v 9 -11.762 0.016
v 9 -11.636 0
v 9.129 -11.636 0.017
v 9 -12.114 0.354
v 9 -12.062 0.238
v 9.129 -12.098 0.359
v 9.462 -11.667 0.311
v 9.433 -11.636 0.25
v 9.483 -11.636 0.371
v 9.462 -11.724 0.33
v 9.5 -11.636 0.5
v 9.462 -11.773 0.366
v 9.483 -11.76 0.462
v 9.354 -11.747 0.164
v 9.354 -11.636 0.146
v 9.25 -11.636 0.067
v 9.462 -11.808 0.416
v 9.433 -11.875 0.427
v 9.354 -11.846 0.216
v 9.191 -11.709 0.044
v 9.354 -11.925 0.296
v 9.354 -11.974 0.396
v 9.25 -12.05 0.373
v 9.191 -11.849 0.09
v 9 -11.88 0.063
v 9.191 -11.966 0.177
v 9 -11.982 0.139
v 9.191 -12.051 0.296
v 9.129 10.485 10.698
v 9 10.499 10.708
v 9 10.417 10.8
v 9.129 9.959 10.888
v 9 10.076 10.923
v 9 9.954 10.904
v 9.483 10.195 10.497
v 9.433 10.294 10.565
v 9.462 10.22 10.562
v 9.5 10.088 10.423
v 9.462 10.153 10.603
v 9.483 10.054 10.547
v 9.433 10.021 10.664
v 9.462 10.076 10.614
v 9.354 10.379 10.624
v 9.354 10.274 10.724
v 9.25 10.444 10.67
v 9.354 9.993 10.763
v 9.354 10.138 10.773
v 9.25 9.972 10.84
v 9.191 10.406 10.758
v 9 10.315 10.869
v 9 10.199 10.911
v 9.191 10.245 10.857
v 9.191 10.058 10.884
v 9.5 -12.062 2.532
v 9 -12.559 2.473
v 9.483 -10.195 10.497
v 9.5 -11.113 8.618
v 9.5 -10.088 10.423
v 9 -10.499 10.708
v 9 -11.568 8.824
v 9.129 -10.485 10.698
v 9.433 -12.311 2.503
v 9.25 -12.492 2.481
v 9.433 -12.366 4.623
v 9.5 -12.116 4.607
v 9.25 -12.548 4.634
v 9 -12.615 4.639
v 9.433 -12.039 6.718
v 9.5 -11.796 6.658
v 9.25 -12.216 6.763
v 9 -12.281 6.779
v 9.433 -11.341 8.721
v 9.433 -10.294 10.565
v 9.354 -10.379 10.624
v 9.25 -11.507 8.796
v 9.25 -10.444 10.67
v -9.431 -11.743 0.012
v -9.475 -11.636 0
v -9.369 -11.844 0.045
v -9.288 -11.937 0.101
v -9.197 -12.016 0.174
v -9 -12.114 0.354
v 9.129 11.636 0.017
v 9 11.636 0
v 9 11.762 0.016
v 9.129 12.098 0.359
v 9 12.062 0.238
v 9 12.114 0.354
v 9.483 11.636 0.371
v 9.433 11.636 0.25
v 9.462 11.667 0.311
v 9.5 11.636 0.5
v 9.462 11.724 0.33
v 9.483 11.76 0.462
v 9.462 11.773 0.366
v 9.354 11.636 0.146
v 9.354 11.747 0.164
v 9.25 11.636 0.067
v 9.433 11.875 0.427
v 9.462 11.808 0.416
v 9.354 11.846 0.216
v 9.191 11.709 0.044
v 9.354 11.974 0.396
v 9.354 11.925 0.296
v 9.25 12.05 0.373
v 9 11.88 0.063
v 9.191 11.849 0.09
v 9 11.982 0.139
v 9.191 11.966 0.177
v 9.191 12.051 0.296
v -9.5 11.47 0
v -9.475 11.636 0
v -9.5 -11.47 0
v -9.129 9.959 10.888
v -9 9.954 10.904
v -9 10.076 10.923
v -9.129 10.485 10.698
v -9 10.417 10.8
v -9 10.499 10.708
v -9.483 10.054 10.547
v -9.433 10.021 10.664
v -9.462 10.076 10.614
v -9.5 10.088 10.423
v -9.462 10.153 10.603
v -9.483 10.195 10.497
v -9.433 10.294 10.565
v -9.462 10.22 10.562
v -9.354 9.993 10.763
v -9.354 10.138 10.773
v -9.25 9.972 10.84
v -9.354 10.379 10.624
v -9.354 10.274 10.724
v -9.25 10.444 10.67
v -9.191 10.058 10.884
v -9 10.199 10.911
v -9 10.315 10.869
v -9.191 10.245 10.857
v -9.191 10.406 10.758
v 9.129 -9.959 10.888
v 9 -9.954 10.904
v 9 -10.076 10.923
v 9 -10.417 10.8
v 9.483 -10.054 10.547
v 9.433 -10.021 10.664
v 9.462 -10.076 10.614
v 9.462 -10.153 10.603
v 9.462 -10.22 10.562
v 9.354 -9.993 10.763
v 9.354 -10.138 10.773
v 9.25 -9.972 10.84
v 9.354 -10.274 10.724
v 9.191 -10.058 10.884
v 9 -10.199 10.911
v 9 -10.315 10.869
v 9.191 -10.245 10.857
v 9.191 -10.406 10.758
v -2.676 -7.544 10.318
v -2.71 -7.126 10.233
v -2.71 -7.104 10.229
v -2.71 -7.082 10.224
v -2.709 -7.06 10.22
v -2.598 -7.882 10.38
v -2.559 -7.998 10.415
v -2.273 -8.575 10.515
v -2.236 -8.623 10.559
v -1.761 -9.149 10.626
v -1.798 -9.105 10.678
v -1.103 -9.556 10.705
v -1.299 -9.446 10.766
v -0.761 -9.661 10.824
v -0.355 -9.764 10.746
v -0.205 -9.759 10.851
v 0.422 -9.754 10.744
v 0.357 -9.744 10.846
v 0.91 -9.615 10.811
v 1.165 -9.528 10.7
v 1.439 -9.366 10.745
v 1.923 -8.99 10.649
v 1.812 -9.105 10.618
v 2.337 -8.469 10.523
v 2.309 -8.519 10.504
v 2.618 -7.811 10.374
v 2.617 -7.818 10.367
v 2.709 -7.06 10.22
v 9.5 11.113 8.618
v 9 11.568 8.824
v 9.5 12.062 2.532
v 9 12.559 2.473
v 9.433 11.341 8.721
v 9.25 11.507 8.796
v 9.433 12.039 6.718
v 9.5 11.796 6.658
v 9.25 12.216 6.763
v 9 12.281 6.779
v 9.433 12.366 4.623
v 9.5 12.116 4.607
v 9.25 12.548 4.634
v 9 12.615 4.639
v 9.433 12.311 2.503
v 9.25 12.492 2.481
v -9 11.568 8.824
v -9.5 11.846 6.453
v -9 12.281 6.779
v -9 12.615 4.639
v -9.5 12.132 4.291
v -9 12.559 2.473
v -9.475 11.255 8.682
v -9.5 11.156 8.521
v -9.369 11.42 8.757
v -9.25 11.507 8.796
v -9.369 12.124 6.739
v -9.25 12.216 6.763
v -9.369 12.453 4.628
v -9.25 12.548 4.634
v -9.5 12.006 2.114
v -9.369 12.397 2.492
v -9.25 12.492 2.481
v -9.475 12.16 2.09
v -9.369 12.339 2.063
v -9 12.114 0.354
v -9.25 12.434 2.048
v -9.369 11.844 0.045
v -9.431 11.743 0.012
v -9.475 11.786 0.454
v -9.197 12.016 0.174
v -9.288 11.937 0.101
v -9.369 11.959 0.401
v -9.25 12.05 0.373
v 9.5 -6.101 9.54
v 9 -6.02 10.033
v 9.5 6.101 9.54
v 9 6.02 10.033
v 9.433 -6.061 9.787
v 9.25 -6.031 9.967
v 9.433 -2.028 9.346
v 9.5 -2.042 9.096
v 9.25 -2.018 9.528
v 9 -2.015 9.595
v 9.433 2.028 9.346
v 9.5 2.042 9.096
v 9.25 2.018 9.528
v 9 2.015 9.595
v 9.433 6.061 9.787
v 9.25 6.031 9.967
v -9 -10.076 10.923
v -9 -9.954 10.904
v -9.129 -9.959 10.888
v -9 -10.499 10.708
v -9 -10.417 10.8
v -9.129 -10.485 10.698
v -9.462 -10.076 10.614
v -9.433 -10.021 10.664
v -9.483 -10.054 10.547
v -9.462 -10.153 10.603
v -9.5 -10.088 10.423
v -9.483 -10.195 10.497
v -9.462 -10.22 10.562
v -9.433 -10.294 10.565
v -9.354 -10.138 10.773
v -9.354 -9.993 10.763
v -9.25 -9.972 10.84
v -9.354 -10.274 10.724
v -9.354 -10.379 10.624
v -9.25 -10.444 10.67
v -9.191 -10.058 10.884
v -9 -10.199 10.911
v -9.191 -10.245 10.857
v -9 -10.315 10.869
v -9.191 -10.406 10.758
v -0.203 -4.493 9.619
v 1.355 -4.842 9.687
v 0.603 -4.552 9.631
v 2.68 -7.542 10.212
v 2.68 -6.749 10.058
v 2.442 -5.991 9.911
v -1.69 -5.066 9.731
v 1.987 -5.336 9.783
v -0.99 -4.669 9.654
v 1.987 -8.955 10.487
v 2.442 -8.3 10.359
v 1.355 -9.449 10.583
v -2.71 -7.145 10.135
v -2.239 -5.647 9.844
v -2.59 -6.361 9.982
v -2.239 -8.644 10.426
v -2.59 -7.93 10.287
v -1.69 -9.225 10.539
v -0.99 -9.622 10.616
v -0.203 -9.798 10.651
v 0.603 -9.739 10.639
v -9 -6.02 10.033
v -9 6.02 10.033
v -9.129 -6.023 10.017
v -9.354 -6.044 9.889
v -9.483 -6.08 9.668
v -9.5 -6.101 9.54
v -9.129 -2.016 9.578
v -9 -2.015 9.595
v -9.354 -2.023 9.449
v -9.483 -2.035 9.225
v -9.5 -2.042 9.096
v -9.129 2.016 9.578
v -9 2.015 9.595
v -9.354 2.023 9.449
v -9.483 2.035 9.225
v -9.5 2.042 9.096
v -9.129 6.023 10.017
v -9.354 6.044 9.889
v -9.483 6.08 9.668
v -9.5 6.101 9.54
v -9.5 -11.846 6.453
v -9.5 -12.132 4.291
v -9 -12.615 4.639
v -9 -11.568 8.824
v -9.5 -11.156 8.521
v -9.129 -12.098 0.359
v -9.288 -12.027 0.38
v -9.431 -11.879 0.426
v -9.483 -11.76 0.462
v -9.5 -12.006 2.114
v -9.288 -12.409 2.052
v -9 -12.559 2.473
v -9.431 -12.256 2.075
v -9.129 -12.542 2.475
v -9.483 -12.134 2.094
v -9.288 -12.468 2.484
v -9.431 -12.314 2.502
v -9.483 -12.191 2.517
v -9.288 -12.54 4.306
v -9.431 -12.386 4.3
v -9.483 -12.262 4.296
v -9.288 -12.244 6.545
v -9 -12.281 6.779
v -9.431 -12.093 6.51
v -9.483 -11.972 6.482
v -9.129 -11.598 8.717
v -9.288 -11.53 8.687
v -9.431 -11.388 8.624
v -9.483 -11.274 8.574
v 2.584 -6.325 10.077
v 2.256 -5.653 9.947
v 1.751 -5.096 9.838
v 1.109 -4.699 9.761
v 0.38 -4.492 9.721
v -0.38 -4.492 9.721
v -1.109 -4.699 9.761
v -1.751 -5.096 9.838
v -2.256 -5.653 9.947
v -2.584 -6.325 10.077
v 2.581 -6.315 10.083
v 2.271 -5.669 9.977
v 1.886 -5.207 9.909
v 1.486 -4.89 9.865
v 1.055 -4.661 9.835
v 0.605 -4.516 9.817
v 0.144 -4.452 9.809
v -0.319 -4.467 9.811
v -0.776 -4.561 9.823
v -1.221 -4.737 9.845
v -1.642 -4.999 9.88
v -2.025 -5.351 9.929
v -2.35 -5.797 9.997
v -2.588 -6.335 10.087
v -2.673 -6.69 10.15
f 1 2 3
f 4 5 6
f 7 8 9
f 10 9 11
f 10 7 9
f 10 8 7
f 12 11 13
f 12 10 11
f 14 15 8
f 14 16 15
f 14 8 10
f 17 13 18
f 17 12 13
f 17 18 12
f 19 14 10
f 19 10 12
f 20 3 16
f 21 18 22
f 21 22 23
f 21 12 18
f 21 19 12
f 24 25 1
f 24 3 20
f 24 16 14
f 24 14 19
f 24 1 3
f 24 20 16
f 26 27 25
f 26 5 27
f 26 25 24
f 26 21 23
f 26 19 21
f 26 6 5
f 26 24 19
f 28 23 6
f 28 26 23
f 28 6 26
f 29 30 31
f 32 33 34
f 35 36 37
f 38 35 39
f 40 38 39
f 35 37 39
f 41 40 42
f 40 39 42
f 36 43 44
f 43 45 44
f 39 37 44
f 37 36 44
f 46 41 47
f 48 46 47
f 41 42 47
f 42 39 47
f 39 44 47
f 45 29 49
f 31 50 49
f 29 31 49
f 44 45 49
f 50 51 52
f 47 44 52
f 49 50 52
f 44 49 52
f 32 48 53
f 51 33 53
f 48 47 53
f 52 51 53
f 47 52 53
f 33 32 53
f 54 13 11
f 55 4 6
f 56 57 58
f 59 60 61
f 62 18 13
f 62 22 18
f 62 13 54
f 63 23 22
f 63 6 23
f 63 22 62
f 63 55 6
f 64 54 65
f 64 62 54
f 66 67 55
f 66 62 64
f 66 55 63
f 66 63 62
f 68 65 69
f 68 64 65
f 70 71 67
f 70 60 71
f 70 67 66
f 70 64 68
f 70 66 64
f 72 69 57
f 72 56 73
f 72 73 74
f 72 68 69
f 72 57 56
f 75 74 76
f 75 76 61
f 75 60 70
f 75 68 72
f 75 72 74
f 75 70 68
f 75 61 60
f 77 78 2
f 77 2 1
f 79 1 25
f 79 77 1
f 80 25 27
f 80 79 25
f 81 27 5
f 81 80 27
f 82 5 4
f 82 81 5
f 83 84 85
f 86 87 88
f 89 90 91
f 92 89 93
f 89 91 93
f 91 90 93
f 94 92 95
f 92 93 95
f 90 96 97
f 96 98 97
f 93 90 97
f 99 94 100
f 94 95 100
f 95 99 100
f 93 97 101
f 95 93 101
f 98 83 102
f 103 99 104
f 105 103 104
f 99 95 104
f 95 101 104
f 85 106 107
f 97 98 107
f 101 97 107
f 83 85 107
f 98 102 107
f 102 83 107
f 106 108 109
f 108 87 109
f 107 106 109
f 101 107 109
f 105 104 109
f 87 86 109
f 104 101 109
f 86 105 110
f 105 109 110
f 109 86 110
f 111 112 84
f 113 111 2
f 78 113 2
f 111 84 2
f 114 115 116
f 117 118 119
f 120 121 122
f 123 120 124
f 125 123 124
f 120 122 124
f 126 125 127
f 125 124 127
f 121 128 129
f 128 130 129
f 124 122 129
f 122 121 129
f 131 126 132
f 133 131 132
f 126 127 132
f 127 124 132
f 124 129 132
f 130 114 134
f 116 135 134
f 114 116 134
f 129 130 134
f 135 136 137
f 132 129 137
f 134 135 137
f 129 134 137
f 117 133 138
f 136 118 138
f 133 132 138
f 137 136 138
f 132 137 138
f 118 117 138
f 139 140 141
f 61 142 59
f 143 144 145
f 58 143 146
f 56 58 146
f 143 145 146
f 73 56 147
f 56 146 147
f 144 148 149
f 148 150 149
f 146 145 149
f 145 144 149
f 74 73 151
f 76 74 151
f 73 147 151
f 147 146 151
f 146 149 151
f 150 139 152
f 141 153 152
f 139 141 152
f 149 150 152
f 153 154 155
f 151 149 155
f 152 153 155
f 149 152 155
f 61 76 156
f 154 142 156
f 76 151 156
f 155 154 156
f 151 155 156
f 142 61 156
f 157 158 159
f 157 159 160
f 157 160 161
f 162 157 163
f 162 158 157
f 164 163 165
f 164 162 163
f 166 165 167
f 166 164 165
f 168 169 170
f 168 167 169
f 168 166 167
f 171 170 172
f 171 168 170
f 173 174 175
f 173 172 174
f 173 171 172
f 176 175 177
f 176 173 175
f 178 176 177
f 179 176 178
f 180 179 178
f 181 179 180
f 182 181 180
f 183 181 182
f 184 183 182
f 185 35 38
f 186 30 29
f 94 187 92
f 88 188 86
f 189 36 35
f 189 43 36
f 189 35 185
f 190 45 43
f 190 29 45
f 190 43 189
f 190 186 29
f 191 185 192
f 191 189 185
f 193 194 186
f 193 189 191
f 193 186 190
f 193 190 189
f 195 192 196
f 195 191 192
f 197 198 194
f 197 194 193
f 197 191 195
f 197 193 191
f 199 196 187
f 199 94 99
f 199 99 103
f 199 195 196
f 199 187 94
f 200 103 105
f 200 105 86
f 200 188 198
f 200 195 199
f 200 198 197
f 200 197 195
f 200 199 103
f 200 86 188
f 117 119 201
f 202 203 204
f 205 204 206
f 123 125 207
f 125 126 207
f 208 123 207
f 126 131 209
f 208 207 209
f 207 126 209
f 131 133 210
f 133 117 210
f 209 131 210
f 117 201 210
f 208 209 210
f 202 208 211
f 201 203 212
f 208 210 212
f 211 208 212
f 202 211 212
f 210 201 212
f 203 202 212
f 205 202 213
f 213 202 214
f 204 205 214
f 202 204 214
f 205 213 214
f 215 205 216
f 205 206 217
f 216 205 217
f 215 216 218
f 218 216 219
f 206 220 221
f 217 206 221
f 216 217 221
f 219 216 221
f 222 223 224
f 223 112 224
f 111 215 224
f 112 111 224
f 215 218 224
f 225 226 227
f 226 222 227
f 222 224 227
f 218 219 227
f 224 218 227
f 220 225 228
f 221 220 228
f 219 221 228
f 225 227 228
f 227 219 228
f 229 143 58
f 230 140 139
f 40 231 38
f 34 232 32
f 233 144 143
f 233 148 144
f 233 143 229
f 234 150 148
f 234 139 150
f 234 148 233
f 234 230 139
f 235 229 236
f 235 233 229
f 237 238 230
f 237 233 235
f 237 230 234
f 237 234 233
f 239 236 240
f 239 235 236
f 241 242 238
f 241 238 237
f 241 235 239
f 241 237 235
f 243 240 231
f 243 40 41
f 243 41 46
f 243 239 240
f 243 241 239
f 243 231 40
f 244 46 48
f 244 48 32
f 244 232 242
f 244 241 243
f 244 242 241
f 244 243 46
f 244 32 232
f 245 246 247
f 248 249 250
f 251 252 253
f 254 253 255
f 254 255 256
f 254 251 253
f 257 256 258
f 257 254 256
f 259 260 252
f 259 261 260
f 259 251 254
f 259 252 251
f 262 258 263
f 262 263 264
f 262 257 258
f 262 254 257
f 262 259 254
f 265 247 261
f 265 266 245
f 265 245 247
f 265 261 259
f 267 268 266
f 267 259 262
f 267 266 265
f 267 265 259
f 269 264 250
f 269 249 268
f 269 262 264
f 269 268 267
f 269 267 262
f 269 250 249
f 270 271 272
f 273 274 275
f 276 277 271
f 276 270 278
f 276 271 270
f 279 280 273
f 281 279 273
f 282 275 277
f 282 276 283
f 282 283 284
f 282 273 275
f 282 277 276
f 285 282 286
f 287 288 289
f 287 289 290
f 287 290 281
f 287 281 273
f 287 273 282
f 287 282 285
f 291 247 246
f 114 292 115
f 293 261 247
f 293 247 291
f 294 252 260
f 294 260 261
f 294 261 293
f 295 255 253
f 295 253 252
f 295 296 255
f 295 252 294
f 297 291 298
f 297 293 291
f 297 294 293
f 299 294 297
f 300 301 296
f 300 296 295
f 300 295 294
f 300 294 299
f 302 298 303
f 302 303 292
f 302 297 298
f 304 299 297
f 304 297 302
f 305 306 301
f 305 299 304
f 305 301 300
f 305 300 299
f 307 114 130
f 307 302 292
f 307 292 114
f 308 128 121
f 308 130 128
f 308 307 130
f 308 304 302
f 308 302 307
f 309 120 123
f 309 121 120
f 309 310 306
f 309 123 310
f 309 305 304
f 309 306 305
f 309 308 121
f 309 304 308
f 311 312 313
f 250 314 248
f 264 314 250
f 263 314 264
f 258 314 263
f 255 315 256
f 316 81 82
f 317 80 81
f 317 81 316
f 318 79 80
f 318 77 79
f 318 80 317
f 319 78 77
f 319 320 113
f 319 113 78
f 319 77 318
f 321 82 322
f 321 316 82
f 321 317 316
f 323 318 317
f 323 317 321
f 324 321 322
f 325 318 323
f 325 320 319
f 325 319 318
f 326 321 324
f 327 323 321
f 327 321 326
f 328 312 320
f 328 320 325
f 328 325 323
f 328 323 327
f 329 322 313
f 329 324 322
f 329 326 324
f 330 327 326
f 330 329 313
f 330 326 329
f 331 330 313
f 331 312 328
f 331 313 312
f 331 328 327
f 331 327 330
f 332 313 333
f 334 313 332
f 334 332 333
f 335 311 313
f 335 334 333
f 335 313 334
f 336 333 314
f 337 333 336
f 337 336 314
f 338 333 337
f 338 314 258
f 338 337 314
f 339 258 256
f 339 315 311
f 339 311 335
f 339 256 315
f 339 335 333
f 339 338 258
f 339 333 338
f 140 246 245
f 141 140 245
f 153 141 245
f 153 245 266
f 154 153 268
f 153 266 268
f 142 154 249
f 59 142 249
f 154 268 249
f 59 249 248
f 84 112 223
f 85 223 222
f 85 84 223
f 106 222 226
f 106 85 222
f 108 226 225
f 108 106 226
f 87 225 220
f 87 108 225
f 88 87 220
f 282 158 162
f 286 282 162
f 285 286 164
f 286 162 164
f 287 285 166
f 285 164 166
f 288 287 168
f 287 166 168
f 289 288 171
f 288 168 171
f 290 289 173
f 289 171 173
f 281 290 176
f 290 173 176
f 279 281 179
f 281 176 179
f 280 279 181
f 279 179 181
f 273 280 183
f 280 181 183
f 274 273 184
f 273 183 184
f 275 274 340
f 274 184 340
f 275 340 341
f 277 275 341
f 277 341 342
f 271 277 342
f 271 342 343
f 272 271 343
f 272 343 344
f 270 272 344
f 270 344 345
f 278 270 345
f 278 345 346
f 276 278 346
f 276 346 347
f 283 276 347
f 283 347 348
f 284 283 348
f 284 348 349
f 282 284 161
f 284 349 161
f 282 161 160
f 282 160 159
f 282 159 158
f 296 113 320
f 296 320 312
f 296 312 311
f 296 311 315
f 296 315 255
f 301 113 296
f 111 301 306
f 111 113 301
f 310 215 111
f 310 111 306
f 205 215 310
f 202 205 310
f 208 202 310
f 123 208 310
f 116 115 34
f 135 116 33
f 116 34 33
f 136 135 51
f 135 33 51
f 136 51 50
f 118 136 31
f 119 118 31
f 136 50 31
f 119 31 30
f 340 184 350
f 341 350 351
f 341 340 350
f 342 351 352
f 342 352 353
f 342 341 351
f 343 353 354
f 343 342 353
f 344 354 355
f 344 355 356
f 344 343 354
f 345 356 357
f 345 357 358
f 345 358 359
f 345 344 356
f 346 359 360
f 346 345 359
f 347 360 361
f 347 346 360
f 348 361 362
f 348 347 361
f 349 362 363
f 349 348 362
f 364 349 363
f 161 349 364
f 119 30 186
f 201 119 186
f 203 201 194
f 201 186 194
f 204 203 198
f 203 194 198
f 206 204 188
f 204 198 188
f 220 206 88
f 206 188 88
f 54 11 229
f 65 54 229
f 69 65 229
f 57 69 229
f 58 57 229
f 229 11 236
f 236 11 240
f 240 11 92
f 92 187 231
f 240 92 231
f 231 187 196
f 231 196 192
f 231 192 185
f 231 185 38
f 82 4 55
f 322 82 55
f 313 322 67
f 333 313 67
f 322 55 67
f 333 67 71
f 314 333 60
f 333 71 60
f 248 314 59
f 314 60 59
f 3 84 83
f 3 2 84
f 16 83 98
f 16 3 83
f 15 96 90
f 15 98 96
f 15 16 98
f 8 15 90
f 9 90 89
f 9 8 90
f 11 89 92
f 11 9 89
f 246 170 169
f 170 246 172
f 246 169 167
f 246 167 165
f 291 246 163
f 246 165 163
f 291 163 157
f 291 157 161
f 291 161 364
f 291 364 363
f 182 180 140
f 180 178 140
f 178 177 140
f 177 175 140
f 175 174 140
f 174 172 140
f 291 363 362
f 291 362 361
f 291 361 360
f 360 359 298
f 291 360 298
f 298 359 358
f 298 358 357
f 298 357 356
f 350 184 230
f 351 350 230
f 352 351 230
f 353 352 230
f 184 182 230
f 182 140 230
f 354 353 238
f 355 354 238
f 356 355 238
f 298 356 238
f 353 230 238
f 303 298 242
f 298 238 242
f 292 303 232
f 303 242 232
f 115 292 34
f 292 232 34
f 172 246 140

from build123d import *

# Parameters (mm, degrees)
BOSS_EXTRUDE2_DEPTH     = 9.5
FILLET1_R               = 0.5
SKETCH3_R               = 2.71
CUT_EXTRUDE1_DEPTH      = 5.448751278
CUT_EXTRUDE1_DEPTH_BACK = 0.1


with BuildPart() as part:
    # Sketch2 → Boss-Extrude2 (new body, symmetric)
    with BuildSketch(Plane(origin=(0, 0, 0), x_dir=(0, 0, -1), z_dir=(1, 0, 0))):
        with BuildLine():
            Line((0, 12), (0, -12))
            ThreePointArc((0, -12), (-5.710285596, -12.497714363), (-11, -10.29))
            ThreePointArc((-11, -10.29), (-9.540341867, 0), (-11, 10.29))
            ThreePointArc((-11, 10.29), (-5.710285596, 12.497714363), (0, 12))
        make_face()
    extrude(amount=BOSS_EXTRUDE2_DEPTH, both=True)

    # Fillet1
    fillet1_edges = [part.edges().sort_by_distance(p)[0] for p in [
        (9.5, 12.497714363, 5.710285596),
        (9.5, 0, 9.540341867),
        (9.5, -12.497714363, 5.710285596),
        (-9.5, 0, 9.540341867),
        (-9.5, 12.497714363, 5.710285596),
        (-9.5, -12.497714363, 5.710285596),
        (0, -10.29, 11),
        (0, 10.29, 11),
        (0, 12, 0),
        (0, -12, 0),
        (9.5, 0, 0),
    ]]
    fillet(fillet1_edges, radius=FILLET1_R)

    # Sketch3 → Cut-Extrude1 (cut, two sides)
    with BuildSketch(Plane(origin=(0, 1.657226633, 8.525691928), x_dir=(-1, 0, 0), z_dir=(0, 0.190808995, 0.981627183))) as cut_extrude1_sk:
        with Locations((0, 8.947950155)):
            Circle(SKETCH3_R)
    extrude(amount=CUT_EXTRUDE1_DEPTH, mode=Mode.SUBTRACT)
    extrude(cut_extrude1_sk.sketch, amount=-CUT_EXTRUDE1_DEPTH_BACK, mode=Mode.SUBTRACT)


solid = part.part
